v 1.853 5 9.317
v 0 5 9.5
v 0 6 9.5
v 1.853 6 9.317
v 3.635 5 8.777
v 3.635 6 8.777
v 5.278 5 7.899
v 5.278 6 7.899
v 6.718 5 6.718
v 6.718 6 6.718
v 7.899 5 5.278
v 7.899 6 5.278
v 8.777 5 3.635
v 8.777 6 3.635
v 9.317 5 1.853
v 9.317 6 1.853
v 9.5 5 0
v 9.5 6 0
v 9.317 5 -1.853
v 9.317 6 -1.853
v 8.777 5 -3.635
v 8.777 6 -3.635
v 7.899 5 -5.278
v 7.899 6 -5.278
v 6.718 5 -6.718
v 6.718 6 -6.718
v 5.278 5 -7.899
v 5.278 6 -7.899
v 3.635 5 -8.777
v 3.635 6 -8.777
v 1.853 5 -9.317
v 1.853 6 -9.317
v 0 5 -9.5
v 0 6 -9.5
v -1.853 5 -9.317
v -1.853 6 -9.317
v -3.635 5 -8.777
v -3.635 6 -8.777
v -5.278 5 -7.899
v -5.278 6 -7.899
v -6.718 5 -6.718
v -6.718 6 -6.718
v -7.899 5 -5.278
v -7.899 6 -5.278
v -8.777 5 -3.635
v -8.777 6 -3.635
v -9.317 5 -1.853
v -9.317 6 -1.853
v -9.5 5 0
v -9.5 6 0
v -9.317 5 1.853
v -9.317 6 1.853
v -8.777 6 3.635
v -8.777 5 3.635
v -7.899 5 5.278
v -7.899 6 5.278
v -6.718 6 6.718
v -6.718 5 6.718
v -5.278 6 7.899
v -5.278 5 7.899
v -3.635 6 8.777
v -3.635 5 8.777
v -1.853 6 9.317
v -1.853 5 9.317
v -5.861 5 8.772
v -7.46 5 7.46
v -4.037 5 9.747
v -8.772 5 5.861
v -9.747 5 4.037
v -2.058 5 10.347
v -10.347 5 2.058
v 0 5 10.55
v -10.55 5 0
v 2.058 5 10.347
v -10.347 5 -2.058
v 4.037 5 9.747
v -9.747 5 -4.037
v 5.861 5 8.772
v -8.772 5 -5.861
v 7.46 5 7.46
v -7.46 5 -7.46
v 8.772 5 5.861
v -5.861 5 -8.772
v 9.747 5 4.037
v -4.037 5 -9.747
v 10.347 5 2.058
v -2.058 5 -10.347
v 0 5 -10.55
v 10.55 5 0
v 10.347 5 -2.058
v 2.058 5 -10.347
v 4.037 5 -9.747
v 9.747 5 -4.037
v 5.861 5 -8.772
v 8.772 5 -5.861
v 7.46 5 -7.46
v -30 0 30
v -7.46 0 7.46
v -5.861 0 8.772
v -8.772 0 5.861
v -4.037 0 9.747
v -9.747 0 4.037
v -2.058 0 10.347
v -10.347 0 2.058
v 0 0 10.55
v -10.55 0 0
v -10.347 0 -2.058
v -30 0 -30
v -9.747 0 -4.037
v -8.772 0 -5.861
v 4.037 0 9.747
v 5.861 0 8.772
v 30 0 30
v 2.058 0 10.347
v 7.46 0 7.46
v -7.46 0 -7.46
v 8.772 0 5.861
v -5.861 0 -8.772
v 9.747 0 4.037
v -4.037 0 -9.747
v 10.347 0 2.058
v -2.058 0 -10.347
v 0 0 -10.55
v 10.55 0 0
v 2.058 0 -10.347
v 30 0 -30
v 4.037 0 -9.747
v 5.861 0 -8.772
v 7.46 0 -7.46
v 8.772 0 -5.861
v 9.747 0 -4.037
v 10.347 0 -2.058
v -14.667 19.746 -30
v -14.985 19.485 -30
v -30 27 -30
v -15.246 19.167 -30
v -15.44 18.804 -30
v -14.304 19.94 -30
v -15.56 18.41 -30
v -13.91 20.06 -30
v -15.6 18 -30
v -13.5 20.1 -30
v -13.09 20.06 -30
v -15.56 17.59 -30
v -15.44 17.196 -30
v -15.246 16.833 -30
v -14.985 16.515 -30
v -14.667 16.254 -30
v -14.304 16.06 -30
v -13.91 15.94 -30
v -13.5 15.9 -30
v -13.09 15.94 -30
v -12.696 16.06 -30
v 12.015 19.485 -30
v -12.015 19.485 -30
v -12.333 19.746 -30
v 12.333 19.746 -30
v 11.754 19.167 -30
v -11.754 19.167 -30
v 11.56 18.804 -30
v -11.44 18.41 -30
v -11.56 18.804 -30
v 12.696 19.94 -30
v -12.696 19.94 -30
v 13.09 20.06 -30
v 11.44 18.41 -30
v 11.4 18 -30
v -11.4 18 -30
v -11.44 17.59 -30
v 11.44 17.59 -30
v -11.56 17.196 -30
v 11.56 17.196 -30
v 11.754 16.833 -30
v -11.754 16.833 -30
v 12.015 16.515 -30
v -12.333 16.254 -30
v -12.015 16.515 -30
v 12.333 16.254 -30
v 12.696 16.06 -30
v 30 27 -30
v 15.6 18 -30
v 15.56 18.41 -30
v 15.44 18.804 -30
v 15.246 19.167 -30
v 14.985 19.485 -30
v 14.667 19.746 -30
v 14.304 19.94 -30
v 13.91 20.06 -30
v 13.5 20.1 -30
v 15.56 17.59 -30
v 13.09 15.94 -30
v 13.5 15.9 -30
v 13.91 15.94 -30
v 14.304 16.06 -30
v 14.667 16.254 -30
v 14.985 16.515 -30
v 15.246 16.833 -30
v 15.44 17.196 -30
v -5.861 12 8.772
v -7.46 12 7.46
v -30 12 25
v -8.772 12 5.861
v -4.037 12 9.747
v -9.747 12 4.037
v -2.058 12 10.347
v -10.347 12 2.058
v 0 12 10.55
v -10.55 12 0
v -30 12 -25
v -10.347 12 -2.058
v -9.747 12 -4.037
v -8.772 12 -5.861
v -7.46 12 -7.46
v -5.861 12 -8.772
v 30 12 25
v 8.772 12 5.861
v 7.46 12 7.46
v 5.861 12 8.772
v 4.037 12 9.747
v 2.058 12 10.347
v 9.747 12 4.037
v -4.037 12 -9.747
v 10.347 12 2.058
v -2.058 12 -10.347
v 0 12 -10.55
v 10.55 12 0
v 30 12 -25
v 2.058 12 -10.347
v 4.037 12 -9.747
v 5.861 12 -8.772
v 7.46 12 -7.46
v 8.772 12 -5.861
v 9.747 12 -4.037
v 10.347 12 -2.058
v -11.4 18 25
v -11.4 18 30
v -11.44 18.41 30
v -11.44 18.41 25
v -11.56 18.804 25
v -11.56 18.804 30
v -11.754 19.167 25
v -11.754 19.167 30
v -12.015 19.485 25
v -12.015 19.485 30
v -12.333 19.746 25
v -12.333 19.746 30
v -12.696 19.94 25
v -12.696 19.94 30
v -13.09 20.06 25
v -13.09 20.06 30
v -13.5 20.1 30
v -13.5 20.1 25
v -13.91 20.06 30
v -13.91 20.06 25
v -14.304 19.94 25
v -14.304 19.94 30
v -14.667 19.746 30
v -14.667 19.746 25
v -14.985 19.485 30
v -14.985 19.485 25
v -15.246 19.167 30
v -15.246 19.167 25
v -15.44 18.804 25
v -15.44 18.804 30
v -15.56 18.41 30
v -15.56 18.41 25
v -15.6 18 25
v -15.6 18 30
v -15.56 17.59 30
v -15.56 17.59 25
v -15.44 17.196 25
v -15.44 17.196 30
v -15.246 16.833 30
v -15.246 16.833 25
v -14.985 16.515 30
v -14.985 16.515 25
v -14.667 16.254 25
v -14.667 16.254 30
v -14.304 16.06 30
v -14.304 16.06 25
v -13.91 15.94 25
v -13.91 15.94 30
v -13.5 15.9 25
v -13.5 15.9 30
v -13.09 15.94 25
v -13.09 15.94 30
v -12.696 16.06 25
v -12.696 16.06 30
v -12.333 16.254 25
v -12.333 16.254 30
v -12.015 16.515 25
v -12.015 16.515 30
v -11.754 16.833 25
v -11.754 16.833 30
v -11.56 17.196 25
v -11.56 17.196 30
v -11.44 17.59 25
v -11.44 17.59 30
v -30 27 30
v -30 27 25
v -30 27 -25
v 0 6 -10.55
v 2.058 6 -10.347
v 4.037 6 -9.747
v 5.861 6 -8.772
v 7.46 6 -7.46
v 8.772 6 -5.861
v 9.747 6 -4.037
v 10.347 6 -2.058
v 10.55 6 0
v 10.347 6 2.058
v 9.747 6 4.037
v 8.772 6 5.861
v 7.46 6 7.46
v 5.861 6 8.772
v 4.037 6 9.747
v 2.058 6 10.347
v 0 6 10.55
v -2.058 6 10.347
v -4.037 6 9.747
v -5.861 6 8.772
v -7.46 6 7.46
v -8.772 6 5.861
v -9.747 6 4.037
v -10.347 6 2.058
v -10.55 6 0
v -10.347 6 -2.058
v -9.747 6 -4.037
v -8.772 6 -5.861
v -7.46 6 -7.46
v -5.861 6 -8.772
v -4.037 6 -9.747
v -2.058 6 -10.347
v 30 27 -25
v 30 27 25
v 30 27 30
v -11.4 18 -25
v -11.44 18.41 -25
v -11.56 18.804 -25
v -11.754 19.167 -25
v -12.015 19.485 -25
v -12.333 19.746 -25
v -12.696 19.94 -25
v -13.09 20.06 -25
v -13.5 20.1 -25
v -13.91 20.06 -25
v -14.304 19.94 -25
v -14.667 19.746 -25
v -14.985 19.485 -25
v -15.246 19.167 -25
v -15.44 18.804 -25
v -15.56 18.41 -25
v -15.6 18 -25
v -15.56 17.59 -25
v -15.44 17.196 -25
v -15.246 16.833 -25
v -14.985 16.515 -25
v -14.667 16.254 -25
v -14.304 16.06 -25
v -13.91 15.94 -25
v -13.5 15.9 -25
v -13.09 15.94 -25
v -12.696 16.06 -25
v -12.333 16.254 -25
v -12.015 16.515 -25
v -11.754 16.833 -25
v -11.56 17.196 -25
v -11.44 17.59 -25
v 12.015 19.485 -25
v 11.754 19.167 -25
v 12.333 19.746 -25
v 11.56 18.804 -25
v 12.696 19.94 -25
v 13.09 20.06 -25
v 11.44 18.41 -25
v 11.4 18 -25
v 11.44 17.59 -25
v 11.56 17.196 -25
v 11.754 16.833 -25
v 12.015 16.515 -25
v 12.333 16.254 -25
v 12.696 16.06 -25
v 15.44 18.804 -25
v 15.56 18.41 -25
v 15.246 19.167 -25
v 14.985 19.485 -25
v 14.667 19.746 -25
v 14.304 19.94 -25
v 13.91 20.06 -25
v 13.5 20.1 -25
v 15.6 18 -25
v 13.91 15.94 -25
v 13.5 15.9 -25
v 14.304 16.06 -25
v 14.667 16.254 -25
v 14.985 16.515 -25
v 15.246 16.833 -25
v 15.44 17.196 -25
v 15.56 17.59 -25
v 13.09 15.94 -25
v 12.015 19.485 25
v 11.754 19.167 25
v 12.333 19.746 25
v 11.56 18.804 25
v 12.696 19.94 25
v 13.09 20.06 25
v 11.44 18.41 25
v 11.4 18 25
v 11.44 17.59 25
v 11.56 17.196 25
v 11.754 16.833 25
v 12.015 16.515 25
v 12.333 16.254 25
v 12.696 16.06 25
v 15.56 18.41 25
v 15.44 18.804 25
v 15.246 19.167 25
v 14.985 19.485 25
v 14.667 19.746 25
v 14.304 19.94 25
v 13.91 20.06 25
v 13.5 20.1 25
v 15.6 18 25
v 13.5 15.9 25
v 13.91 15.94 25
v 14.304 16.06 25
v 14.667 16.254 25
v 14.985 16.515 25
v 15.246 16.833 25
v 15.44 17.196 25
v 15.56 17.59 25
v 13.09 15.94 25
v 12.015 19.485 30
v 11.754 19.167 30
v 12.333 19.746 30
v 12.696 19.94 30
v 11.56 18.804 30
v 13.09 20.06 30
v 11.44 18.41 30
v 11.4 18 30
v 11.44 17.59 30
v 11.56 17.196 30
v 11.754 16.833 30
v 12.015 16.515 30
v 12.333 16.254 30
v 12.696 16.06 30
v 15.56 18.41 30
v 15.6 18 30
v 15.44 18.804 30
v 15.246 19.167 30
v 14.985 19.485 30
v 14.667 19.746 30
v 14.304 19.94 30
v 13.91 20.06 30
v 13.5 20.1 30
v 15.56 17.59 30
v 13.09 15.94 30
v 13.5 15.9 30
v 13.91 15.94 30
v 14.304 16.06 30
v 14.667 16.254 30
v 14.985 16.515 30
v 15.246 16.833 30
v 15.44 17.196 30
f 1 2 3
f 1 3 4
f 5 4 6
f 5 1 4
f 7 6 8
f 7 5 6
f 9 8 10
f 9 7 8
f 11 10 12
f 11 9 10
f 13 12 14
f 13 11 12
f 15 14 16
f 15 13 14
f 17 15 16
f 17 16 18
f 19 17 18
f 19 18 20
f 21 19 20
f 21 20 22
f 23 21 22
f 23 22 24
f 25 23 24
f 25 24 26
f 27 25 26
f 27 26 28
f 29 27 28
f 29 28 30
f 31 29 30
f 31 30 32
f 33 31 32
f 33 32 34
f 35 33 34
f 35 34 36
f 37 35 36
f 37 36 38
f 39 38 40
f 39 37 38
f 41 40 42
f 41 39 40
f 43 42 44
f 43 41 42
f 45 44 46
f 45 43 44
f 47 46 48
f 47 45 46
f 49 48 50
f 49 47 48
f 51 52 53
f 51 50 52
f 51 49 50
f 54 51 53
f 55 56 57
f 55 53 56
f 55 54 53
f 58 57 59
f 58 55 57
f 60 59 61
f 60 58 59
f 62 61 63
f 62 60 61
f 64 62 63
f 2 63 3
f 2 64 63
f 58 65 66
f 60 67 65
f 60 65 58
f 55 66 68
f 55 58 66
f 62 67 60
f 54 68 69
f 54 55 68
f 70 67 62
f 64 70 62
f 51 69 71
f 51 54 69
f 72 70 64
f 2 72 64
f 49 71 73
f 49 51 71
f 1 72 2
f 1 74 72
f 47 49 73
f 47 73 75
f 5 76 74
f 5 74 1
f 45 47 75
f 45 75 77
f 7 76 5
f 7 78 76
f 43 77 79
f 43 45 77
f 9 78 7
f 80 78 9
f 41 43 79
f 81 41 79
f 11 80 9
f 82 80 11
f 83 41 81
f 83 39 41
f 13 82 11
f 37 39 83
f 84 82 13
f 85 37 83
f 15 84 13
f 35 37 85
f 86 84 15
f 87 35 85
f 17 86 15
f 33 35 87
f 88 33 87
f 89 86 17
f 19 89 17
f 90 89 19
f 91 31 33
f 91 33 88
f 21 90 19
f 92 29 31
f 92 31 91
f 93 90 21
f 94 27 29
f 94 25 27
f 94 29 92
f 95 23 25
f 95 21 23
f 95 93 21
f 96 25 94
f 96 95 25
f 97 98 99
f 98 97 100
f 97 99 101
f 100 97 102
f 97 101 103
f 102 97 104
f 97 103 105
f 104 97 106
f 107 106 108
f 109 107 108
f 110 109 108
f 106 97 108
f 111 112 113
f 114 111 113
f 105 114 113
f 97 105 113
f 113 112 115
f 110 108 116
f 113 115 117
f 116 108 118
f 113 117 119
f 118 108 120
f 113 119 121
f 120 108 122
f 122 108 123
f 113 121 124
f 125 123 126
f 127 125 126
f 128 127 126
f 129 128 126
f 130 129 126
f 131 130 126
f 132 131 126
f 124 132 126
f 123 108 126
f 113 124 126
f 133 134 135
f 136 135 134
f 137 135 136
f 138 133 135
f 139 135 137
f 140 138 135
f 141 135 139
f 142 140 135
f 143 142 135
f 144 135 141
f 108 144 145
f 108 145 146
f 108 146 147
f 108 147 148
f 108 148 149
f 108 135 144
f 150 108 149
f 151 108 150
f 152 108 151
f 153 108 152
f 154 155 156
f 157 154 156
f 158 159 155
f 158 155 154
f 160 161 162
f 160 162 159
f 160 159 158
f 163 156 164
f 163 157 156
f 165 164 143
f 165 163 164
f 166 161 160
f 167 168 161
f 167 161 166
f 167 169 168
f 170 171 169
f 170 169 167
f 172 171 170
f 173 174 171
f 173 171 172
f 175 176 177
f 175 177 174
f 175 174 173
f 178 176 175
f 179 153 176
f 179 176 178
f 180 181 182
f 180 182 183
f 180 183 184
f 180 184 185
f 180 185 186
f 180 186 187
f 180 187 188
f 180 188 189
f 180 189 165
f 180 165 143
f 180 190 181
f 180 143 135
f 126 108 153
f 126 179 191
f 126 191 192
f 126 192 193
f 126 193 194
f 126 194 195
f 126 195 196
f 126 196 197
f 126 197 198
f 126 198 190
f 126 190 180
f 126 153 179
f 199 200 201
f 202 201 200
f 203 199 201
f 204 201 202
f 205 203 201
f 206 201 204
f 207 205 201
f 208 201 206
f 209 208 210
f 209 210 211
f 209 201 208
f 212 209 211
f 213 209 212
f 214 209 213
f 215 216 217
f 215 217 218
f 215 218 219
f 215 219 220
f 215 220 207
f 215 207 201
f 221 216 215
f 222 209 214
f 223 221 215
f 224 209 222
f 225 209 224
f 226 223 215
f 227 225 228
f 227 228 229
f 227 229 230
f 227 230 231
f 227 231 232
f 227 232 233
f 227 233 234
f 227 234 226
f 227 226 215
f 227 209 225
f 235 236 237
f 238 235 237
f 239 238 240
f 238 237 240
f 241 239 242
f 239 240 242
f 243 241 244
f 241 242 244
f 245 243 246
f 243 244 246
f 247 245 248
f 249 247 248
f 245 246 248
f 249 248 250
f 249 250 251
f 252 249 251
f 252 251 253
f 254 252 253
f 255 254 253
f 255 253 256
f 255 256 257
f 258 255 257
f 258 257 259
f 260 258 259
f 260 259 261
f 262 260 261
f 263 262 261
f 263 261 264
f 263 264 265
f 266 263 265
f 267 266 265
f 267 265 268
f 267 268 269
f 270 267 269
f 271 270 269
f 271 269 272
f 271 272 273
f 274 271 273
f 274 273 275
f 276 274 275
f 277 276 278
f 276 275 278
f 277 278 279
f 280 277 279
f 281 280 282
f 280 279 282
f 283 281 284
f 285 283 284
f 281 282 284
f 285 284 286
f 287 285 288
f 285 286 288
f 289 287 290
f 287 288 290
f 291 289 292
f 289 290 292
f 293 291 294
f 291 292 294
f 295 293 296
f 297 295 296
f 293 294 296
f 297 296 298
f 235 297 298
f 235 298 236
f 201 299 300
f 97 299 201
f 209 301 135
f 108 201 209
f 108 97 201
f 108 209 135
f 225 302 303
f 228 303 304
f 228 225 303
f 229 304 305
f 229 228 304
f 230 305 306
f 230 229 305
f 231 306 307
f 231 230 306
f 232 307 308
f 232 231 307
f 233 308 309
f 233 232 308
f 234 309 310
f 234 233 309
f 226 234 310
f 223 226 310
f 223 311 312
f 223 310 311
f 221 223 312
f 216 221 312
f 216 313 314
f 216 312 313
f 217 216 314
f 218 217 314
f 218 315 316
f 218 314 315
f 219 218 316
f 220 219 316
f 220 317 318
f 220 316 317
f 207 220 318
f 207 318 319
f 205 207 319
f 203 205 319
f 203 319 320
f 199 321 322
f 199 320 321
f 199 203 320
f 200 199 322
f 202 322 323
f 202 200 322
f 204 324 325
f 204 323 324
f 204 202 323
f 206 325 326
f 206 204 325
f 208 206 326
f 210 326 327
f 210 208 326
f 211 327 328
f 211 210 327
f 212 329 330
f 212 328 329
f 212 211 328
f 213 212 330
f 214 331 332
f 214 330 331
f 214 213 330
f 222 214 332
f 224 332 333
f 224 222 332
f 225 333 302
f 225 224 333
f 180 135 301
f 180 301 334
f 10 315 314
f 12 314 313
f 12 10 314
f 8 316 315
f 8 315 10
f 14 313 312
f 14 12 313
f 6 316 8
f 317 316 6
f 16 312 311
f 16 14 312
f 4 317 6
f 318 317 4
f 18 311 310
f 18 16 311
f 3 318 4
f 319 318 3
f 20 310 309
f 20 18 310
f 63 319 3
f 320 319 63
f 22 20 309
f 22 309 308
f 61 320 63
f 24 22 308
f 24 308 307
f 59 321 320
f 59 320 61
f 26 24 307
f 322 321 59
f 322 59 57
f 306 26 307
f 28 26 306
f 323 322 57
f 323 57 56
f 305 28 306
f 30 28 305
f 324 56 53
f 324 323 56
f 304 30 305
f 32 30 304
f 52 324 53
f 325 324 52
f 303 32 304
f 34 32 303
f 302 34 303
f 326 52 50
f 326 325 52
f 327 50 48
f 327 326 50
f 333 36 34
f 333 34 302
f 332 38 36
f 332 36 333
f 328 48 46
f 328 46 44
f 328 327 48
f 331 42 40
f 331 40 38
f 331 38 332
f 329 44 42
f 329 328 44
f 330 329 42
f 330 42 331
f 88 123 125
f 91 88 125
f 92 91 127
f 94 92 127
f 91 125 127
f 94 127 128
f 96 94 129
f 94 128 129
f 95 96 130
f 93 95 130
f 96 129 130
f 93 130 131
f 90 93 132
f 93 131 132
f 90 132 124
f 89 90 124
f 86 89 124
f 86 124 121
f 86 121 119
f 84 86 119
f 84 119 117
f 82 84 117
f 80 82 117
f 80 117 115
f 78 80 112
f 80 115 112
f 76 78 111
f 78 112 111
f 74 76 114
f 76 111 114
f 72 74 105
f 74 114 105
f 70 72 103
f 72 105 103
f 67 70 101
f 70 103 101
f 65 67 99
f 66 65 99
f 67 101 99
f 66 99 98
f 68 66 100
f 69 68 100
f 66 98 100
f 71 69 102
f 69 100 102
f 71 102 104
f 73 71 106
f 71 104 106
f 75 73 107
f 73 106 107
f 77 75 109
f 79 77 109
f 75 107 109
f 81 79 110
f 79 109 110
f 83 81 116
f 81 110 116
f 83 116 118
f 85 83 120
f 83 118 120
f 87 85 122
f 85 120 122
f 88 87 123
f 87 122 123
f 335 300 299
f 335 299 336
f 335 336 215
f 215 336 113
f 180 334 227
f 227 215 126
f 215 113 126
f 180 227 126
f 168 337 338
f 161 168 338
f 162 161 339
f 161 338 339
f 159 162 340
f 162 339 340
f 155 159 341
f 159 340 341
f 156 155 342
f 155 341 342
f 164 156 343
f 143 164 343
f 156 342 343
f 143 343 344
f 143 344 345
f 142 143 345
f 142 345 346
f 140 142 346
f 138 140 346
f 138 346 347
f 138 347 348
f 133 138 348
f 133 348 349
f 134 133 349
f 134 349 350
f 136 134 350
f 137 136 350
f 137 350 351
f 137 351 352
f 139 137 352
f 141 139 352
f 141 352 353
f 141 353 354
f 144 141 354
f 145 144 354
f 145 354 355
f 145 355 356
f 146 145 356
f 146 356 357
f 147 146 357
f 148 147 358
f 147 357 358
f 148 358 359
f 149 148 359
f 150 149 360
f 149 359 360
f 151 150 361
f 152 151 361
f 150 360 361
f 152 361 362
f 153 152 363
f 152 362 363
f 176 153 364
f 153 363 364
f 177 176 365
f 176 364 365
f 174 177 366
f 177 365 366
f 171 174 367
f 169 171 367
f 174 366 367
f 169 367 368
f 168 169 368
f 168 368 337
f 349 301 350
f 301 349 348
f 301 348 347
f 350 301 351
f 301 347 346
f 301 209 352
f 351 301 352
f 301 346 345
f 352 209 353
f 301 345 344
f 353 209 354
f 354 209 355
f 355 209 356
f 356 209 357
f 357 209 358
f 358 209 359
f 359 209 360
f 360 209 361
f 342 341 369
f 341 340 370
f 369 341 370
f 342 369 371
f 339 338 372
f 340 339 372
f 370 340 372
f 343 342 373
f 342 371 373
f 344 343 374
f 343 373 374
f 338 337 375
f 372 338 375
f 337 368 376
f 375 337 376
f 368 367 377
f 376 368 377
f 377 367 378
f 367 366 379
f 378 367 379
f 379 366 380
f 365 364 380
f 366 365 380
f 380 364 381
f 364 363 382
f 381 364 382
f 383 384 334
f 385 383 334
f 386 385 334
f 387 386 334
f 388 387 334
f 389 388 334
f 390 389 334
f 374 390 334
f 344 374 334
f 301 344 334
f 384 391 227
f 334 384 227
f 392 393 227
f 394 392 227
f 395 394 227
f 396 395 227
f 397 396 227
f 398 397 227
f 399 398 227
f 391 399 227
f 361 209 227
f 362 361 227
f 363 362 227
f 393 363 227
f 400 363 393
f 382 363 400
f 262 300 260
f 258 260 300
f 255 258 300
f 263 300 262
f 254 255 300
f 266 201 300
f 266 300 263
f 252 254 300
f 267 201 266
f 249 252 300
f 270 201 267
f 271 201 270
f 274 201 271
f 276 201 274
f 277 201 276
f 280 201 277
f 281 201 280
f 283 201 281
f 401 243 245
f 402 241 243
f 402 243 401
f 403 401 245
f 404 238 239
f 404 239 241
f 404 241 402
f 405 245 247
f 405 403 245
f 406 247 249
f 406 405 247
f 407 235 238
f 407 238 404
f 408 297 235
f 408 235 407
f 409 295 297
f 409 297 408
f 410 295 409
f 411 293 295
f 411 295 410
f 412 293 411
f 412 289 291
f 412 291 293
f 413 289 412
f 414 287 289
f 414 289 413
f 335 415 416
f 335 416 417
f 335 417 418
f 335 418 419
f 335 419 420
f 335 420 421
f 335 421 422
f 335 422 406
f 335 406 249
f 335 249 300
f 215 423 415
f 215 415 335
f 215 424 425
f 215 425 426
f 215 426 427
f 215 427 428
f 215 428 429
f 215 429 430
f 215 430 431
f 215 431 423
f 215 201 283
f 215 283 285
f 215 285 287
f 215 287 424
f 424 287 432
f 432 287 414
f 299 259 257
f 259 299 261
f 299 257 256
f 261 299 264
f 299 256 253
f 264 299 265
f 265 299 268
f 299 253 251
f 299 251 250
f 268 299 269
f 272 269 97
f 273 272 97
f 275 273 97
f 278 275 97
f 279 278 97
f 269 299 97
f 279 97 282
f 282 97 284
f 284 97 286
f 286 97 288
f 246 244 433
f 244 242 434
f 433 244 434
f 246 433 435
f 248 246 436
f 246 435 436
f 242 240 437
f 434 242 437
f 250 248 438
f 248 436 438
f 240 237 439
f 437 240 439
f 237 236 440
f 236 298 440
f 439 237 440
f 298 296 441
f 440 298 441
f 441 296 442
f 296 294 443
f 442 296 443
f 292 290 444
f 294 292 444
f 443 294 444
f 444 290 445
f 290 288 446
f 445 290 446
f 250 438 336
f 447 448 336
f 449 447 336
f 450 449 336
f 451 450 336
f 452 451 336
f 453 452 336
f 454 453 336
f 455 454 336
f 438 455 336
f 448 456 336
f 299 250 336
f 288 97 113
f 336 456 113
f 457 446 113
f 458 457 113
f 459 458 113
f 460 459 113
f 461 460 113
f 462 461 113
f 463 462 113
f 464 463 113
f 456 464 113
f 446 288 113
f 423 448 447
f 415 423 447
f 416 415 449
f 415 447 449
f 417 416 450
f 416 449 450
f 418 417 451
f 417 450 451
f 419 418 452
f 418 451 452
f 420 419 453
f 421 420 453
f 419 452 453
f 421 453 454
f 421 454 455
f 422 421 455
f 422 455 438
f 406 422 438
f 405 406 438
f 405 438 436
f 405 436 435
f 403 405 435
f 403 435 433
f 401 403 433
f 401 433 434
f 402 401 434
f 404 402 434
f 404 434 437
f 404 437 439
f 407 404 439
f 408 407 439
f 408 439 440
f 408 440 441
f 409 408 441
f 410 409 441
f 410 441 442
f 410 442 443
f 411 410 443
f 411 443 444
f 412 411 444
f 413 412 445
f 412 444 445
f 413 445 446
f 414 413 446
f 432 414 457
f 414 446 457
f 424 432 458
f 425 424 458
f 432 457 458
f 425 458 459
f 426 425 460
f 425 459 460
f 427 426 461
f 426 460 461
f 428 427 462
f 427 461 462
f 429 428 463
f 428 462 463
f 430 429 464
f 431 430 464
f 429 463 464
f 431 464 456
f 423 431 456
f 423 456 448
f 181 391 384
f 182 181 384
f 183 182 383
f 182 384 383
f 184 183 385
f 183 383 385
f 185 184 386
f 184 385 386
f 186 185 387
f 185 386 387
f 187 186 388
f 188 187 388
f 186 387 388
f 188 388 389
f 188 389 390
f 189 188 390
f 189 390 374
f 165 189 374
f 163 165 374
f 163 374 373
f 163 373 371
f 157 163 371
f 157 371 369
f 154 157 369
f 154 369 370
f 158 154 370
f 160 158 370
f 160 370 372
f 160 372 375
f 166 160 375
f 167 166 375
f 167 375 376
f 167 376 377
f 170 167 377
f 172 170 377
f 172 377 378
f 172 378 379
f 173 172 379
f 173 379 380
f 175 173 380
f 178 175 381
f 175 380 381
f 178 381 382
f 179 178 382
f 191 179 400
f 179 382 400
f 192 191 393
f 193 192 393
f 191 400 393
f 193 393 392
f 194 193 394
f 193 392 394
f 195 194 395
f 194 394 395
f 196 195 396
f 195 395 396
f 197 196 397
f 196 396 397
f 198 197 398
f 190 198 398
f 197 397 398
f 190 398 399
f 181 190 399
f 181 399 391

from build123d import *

# Parameters (mm, degrees)
SKETCH_1_W          = 60
SKETCH_1_H          = 60
SKETCH_1_R          = 9.5
EXTRUDE_1_DEPTH     = 12
SKETCH_3_R          = 10.55
CUT_EXTRUDE_1_DEPTH = 5
SKETCH_6_W          = 60
SKETCH_6_H          = 5
EXTRUDE_2_DEPTH     = 15
SKETCH_7_R          = 2.1
CUT_EXTRUDE_2_DEPTH = 73.311824759
SKETCH_8_R          = 10.55
CUT_EXTRUDE_3_DEPTH = 1


with BuildPart() as part:
    # 草图1 → 凸台-拉伸1 (new body)
    with BuildSketch(Plane(origin=(0, 0, 0), x_dir=(1, 0, 0), z_dir=(0, 1, 0))):
        Rectangle(SKETCH_1_W, SKETCH_1_H)
        with Locations(Location((0, 0, 0), (0, 0, 270))):
            Circle(SKETCH_1_R, mode=Mode.SUBTRACT)
    extrude(amount=EXTRUDE_1_DEPTH)

    # 草图3 → 切除-拉伸1 (cut)
    with BuildSketch(Plane.XZ):
        with Locations(Location((0, 0, 0), (0, 0, 270))):
            Circle(SKETCH_3_R)
    cut_extrude_1 = extrude(amount=-CUT_EXTRUDE_1_DEPTH, mode=Mode.SUBTRACT)

    # 镜向1: 切除-拉伸1 across plane
    add(cut_extrude_1.mirror(Plane(origin=(0, 6, 0), x_dir=(0, 0, 1), z_dir=(0, -1, 0))), mode=Mode.SUBTRACT)

    # 草图6 → 凸台-拉伸2 (add)
    with BuildSketch(Plane(origin=(0, 12, 0), x_dir=(1, 0, 0), z_dir=(0, 1, 0))):
        with Locations((0, 27.5)):
            Rectangle(SKETCH_6_W, SKETCH_6_H)
        with Locations((0, -27.5)):
            Rectangle(SKETCH_6_W, SKETCH_6_H)
    extrude(amount=EXTRUDE_2_DEPTH)

    # 草图7 → 切除-拉伸2 (cut, through all)
    with BuildSketch(Plane.XY.offset(30)):
        with Locations((-13.5, 18)):
            Circle(SKETCH_7_R)
        with Locations((13.5, 18)):
            Circle(SKETCH_7_R)
    extrude(amount=-CUT_EXTRUDE_2_DEPTH, mode=Mode.SUBTRACT)

    # 草图8 → 切除-拉伸3 (cut)
    with BuildSketch(Plane(origin=(0, 7, 0), x_dir=(1, 0, 0), z_dir=(0, 1, 0))):
        with Locations(Location((0, 0, 0), (0, 0, 90))):
            Circle(SKETCH_8_R)
    extrude(amount=-CUT_EXTRUDE_3_DEPTH, mode=Mode.SUBTRACT)


solid = part.part
